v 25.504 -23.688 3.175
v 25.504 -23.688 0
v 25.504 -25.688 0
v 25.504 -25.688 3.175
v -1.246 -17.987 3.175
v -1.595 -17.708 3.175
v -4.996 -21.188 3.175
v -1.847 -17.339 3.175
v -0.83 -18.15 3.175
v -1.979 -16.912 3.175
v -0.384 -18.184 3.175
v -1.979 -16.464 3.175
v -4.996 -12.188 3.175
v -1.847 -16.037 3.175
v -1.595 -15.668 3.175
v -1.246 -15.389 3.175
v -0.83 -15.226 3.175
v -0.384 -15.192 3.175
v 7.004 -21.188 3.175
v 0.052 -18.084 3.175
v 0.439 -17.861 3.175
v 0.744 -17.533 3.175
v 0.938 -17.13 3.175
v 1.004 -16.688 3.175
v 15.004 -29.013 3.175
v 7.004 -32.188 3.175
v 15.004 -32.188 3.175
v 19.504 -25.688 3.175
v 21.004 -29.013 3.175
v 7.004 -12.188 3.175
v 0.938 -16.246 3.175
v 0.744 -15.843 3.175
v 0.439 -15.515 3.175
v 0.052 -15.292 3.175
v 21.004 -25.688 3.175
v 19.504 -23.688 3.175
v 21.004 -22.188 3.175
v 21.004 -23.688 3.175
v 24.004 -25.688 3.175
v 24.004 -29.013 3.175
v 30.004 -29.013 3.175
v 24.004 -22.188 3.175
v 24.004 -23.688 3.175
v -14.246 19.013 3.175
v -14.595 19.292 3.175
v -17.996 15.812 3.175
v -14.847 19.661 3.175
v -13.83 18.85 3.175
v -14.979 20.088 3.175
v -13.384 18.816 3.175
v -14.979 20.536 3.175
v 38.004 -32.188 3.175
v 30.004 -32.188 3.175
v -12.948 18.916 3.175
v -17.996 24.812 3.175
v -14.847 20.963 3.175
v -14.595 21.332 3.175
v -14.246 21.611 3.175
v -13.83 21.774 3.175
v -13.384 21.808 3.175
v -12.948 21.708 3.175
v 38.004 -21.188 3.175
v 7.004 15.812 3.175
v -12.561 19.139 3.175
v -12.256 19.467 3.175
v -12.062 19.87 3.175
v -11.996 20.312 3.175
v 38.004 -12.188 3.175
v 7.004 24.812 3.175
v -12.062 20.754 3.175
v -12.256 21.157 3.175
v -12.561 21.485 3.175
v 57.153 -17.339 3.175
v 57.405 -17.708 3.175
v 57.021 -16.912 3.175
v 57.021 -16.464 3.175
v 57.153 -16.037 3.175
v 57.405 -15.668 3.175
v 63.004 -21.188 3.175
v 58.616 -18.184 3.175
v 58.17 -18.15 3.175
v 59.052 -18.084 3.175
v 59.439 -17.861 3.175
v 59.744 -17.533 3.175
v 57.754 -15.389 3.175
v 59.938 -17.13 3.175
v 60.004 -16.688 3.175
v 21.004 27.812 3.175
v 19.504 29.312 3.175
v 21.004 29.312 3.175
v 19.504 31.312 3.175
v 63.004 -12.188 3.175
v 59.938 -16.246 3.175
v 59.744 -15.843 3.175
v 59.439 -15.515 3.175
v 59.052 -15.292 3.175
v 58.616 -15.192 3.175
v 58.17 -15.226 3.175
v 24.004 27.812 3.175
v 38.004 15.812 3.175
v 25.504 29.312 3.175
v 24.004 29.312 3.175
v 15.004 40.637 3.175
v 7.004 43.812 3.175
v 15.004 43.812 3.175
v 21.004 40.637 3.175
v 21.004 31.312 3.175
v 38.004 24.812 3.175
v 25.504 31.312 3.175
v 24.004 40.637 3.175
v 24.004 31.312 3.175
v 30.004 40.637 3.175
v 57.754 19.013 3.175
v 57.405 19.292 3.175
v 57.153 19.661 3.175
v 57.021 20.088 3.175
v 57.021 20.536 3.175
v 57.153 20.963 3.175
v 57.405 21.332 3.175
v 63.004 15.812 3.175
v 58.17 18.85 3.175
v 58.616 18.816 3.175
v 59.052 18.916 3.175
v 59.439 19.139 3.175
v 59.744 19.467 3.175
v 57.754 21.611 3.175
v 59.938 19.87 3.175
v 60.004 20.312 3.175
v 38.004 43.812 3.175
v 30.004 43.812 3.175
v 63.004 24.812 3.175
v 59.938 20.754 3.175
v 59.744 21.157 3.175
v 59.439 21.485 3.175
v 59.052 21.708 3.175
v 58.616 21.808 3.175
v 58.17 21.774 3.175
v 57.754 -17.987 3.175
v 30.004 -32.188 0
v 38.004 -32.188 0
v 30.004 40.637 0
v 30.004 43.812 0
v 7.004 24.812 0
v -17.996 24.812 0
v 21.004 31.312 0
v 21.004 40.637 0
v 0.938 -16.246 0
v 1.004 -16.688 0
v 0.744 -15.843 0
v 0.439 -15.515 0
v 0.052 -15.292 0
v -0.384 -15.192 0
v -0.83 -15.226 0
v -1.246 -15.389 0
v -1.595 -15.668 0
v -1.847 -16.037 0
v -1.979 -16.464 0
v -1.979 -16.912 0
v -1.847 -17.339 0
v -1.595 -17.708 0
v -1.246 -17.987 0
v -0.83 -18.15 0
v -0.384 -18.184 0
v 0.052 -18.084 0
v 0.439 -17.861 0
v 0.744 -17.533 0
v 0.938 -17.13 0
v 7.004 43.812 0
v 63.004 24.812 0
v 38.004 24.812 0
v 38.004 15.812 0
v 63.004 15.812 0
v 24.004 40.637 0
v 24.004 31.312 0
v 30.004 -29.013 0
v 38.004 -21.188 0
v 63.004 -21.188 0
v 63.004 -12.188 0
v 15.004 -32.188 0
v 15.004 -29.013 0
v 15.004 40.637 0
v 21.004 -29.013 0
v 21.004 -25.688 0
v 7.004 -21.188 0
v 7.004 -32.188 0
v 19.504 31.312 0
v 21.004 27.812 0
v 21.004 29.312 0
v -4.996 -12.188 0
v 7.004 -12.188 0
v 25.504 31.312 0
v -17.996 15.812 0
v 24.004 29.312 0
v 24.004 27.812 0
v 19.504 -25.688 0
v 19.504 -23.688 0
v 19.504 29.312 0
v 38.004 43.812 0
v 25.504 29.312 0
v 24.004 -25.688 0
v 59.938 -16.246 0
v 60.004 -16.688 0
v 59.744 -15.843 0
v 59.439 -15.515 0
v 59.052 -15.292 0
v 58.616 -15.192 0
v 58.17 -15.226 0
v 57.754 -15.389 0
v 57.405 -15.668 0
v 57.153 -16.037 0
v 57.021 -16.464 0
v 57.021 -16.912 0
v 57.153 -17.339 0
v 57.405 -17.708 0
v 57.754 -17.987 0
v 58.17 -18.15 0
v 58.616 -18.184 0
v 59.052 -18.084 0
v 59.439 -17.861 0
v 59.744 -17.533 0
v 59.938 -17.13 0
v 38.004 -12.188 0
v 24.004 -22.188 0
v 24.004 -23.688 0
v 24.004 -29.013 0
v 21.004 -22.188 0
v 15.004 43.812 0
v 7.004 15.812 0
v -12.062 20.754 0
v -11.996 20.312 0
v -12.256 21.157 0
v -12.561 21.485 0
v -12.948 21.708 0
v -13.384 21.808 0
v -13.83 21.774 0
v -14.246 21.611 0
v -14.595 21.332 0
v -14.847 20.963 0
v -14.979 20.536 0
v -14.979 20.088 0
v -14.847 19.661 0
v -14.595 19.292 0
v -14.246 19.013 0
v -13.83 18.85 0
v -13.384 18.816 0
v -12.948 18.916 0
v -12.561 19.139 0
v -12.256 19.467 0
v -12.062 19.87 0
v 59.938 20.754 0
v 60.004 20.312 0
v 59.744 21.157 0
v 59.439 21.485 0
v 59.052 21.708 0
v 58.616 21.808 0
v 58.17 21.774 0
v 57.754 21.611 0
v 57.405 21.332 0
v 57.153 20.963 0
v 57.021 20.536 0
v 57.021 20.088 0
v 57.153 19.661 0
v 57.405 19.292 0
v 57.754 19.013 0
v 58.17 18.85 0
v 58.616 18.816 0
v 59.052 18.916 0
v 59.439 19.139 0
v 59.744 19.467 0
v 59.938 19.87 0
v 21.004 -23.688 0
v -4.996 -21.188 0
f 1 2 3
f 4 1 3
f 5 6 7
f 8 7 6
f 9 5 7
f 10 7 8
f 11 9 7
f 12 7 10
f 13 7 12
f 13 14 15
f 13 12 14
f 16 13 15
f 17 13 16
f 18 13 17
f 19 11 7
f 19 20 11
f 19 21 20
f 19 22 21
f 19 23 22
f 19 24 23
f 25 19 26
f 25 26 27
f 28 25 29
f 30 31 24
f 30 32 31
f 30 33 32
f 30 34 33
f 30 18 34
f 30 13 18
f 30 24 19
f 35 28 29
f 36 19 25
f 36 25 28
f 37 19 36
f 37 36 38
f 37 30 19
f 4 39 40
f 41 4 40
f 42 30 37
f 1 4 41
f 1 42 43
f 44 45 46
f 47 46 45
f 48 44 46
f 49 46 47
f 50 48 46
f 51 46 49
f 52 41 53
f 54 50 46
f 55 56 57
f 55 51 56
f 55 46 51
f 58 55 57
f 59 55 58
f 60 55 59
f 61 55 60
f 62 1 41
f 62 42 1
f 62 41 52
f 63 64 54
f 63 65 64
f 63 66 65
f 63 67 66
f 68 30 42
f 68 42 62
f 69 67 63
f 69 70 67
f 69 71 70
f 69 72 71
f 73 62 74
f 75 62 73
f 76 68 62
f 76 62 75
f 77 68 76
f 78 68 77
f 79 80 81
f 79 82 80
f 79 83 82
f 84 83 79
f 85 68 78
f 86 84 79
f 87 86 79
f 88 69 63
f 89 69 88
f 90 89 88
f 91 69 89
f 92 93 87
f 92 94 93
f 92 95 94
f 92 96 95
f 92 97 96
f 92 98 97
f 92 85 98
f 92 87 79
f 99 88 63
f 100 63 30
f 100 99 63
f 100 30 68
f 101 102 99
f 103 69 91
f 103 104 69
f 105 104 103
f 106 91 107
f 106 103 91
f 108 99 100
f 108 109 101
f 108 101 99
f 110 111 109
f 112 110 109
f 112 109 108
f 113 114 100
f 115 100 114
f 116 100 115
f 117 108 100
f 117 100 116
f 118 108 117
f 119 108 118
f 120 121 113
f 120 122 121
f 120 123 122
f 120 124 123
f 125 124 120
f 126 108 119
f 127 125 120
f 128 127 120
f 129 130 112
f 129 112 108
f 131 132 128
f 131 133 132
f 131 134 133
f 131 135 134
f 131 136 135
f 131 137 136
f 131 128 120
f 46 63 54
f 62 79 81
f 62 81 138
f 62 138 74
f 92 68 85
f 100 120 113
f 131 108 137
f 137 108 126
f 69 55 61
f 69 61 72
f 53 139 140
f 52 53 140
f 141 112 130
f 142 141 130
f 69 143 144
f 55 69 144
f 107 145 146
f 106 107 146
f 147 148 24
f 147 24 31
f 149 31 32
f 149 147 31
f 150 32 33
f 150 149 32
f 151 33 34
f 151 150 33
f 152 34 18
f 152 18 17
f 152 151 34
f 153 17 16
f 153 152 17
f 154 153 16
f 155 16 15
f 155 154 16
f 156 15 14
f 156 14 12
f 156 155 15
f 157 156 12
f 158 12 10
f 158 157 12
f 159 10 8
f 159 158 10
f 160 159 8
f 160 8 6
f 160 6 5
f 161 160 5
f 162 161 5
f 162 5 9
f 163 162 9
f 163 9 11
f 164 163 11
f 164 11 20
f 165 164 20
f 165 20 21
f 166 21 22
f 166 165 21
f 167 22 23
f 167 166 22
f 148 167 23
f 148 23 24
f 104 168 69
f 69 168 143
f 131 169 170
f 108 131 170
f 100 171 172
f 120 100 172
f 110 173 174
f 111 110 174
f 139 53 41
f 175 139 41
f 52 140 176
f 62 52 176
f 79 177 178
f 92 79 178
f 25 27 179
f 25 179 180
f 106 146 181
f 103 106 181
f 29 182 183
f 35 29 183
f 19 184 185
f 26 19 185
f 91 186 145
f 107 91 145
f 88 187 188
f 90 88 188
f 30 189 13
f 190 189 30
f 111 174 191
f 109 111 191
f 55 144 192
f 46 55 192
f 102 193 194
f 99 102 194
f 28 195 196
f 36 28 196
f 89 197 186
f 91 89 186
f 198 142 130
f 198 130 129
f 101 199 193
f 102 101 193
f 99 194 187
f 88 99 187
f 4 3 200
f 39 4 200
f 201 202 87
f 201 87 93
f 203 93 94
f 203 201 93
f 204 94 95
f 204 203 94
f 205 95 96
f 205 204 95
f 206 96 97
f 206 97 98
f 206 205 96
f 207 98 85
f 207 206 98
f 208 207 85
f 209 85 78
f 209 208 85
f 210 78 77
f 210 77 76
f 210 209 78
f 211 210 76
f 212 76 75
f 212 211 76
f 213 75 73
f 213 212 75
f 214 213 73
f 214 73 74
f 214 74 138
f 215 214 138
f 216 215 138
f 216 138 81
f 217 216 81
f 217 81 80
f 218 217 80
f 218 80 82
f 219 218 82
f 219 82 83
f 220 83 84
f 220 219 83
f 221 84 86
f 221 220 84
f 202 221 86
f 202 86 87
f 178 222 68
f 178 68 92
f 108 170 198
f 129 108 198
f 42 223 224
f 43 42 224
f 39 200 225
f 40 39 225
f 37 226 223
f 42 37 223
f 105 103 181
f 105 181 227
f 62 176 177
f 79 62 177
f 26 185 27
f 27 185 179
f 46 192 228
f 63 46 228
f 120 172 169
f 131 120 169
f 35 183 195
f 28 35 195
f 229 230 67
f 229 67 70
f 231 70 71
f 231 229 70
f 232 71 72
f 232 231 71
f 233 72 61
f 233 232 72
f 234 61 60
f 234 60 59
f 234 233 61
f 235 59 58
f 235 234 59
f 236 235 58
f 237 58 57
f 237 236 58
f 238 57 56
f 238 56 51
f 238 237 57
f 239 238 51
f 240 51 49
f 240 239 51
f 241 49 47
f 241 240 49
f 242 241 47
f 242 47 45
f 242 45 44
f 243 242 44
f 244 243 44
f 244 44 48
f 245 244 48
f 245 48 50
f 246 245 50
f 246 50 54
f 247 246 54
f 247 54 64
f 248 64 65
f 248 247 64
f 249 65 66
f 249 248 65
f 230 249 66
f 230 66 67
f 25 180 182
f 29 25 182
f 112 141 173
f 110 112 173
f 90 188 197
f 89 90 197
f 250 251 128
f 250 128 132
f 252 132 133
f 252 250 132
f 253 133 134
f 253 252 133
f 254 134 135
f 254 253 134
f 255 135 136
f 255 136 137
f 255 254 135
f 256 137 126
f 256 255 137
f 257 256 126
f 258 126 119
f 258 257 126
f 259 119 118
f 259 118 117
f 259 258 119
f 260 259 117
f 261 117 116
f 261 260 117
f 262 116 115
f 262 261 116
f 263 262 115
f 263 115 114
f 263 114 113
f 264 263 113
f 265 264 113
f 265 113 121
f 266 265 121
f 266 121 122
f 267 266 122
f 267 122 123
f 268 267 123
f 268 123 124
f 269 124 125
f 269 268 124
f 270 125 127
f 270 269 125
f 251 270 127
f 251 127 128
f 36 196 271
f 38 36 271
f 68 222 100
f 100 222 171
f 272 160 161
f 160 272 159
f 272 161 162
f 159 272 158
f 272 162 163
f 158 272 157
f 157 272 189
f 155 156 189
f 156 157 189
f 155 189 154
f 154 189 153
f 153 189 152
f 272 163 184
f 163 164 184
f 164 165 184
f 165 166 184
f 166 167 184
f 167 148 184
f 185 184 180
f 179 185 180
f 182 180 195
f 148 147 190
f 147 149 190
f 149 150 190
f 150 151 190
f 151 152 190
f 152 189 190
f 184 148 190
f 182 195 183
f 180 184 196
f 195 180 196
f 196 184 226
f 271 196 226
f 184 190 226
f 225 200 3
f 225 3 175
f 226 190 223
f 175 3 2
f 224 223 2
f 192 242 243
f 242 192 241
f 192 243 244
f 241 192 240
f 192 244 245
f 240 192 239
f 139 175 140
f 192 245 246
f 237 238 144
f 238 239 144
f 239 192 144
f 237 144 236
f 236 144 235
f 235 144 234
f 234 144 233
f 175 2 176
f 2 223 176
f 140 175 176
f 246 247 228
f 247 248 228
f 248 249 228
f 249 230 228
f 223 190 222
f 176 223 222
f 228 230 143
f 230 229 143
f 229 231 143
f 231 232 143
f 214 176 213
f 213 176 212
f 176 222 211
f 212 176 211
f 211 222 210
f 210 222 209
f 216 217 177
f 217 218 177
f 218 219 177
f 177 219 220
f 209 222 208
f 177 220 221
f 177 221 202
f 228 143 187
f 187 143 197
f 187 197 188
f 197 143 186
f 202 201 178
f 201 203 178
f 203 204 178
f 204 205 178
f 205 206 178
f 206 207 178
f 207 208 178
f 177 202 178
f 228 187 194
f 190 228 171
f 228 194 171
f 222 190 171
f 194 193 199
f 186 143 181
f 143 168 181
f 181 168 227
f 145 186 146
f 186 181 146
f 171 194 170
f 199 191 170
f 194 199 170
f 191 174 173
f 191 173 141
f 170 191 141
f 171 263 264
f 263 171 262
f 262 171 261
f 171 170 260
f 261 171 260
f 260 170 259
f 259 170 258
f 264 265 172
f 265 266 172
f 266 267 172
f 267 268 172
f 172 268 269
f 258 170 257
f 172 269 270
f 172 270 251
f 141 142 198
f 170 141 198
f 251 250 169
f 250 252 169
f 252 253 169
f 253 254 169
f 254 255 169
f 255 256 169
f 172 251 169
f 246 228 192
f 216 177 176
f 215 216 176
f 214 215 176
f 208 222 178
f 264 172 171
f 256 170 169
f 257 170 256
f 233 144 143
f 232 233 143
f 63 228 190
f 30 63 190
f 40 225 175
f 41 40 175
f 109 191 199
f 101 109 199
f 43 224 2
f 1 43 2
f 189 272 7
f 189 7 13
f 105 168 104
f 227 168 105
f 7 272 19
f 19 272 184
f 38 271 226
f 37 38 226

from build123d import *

# Parameters (mm, degrees)
F0_R     = 1.5
F0_W     = 8
F0_H     = 3.175
F0_W_2   = 31
F0_H_2   = 9
F0_W_3   = 12
F0_W_4   = 25
F1_DEPTH = 3.175


# Not quite as in the source:
# - a length typed as a fraction of an inch, garbled in the dataset ("3 / 203.2 mm" for 3/8 in), is restored
# - a feature names something its author has since deleted; it is built from what else it names


with BuildPart() as f1:
    # F0 (on Top) → F1 (new body)
    with BuildSketch(Plane.XY):
        Polygon((7.0042573512, 24.8119444549), (-17.9957426488, 24.8119444549), (-17.9957426488, 15.8119444549), (7.0042573512, 15.8119444549), (22.5042573512, 15.8119444549), (38.0042573512, 15.8119444549), (63.0042573512, 15.8119444549), (63.0042573512, 24.8119444549), (38.0042573512, 24.8119444549), align=None)
        with Locations((-13.4957426488, 20.3119444549)):
            Circle(F0_R, mode=Mode.SUBTRACT)
        with Locations((58.5042573512, 20.3119444549)):
            Circle(F0_R, mode=Mode.SUBTRACT)
        Polygon((7.0042573512, 40.6369444549), (7.0042573512, 24.8119444549), (38.0042573512, 24.8119444549), (38.0042573512, 40.6369444549), (30.0042573512, 40.6369444549), (24.0042573512, 40.6369444549), (24.0042573512, 31.3119444549), (25.5042573512, 31.3119444549), (25.5042573512, 29.3119444549), (24.0042573512, 29.3119444549), (24.0042573512, 27.8119444549), (21.0042573512, 27.8119444549), (21.0042573512, 29.3119444549), (19.5042573512, 29.3119444549), (19.5042573512, 31.3119444549), (21.0042573512, 31.3119444549), (21.0042573512, 40.6369444549), (15.0042573512, 40.6369444549), align=None)
        with Locations((11.0042573512, 42.2244444549)):
            Rectangle(F0_W, F0_H)
        Polygon((22.5042573512, 15.8119444549), (7.0042573512, 15.8119444549), (7.0042573512, -12.1880555451), (38.0042573512, -12.1880555451), (38.0042573512, 15.8119444549), align=None)
        with Locations((34.0042573512, 42.2244444549)):
            Rectangle(F0_W, F0_H)
        with Locations((22.5042573512, -16.6880555451)):
            Rectangle(F0_W_2, F0_H_2)
        with Locations((1.0042573512, -16.6880555451)):
            Rectangle(F0_W_3, F0_H_2)
        with Locations((-0.4957426488, -16.6880555451)):
            Circle(F0_R, mode=Mode.SUBTRACT)
        Polygon((38.0042573512, -21.1880555451), (7.0042573512, -21.1880555451), (7.0042573512, -29.0130555451), (15.0042573512, -29.0130555451), (21.0042573512, -29.0130555451), (21.0042573512, -25.6880555451), (19.5042573512, -25.6880555451), (19.5042573512, -23.6880555451), (21.0042573512, -23.6880555451), (21.0042573512, -22.1880555451), (24.0042573512, -22.1880555451), (24.0042573512, -23.6880555451), (25.5042573512, -23.6880555451), (25.5042573512, -25.6880555451), (24.0042573512, -25.6880555451), (24.0042573512, -29.0130555451), (30.0042573512, -29.0130555451), (38.0042573512, -29.0130555451), align=None)
        with Locations((50.5042573512, -16.6880555451)):
            Rectangle(F0_W_4, F0_H_2)
        with Locations((58.5042573512, -16.6880555451)):
            Circle(F0_R, mode=Mode.SUBTRACT)
        with Locations((11.0042573512, -30.6005555451)):
            Rectangle(F0_W, F0_H)
        with Locations((34.0042573512, -30.6005555451)):
            Rectangle(F0_W, F0_H)
    extrude(amount=F1_DEPTH)


solid = f1.part
